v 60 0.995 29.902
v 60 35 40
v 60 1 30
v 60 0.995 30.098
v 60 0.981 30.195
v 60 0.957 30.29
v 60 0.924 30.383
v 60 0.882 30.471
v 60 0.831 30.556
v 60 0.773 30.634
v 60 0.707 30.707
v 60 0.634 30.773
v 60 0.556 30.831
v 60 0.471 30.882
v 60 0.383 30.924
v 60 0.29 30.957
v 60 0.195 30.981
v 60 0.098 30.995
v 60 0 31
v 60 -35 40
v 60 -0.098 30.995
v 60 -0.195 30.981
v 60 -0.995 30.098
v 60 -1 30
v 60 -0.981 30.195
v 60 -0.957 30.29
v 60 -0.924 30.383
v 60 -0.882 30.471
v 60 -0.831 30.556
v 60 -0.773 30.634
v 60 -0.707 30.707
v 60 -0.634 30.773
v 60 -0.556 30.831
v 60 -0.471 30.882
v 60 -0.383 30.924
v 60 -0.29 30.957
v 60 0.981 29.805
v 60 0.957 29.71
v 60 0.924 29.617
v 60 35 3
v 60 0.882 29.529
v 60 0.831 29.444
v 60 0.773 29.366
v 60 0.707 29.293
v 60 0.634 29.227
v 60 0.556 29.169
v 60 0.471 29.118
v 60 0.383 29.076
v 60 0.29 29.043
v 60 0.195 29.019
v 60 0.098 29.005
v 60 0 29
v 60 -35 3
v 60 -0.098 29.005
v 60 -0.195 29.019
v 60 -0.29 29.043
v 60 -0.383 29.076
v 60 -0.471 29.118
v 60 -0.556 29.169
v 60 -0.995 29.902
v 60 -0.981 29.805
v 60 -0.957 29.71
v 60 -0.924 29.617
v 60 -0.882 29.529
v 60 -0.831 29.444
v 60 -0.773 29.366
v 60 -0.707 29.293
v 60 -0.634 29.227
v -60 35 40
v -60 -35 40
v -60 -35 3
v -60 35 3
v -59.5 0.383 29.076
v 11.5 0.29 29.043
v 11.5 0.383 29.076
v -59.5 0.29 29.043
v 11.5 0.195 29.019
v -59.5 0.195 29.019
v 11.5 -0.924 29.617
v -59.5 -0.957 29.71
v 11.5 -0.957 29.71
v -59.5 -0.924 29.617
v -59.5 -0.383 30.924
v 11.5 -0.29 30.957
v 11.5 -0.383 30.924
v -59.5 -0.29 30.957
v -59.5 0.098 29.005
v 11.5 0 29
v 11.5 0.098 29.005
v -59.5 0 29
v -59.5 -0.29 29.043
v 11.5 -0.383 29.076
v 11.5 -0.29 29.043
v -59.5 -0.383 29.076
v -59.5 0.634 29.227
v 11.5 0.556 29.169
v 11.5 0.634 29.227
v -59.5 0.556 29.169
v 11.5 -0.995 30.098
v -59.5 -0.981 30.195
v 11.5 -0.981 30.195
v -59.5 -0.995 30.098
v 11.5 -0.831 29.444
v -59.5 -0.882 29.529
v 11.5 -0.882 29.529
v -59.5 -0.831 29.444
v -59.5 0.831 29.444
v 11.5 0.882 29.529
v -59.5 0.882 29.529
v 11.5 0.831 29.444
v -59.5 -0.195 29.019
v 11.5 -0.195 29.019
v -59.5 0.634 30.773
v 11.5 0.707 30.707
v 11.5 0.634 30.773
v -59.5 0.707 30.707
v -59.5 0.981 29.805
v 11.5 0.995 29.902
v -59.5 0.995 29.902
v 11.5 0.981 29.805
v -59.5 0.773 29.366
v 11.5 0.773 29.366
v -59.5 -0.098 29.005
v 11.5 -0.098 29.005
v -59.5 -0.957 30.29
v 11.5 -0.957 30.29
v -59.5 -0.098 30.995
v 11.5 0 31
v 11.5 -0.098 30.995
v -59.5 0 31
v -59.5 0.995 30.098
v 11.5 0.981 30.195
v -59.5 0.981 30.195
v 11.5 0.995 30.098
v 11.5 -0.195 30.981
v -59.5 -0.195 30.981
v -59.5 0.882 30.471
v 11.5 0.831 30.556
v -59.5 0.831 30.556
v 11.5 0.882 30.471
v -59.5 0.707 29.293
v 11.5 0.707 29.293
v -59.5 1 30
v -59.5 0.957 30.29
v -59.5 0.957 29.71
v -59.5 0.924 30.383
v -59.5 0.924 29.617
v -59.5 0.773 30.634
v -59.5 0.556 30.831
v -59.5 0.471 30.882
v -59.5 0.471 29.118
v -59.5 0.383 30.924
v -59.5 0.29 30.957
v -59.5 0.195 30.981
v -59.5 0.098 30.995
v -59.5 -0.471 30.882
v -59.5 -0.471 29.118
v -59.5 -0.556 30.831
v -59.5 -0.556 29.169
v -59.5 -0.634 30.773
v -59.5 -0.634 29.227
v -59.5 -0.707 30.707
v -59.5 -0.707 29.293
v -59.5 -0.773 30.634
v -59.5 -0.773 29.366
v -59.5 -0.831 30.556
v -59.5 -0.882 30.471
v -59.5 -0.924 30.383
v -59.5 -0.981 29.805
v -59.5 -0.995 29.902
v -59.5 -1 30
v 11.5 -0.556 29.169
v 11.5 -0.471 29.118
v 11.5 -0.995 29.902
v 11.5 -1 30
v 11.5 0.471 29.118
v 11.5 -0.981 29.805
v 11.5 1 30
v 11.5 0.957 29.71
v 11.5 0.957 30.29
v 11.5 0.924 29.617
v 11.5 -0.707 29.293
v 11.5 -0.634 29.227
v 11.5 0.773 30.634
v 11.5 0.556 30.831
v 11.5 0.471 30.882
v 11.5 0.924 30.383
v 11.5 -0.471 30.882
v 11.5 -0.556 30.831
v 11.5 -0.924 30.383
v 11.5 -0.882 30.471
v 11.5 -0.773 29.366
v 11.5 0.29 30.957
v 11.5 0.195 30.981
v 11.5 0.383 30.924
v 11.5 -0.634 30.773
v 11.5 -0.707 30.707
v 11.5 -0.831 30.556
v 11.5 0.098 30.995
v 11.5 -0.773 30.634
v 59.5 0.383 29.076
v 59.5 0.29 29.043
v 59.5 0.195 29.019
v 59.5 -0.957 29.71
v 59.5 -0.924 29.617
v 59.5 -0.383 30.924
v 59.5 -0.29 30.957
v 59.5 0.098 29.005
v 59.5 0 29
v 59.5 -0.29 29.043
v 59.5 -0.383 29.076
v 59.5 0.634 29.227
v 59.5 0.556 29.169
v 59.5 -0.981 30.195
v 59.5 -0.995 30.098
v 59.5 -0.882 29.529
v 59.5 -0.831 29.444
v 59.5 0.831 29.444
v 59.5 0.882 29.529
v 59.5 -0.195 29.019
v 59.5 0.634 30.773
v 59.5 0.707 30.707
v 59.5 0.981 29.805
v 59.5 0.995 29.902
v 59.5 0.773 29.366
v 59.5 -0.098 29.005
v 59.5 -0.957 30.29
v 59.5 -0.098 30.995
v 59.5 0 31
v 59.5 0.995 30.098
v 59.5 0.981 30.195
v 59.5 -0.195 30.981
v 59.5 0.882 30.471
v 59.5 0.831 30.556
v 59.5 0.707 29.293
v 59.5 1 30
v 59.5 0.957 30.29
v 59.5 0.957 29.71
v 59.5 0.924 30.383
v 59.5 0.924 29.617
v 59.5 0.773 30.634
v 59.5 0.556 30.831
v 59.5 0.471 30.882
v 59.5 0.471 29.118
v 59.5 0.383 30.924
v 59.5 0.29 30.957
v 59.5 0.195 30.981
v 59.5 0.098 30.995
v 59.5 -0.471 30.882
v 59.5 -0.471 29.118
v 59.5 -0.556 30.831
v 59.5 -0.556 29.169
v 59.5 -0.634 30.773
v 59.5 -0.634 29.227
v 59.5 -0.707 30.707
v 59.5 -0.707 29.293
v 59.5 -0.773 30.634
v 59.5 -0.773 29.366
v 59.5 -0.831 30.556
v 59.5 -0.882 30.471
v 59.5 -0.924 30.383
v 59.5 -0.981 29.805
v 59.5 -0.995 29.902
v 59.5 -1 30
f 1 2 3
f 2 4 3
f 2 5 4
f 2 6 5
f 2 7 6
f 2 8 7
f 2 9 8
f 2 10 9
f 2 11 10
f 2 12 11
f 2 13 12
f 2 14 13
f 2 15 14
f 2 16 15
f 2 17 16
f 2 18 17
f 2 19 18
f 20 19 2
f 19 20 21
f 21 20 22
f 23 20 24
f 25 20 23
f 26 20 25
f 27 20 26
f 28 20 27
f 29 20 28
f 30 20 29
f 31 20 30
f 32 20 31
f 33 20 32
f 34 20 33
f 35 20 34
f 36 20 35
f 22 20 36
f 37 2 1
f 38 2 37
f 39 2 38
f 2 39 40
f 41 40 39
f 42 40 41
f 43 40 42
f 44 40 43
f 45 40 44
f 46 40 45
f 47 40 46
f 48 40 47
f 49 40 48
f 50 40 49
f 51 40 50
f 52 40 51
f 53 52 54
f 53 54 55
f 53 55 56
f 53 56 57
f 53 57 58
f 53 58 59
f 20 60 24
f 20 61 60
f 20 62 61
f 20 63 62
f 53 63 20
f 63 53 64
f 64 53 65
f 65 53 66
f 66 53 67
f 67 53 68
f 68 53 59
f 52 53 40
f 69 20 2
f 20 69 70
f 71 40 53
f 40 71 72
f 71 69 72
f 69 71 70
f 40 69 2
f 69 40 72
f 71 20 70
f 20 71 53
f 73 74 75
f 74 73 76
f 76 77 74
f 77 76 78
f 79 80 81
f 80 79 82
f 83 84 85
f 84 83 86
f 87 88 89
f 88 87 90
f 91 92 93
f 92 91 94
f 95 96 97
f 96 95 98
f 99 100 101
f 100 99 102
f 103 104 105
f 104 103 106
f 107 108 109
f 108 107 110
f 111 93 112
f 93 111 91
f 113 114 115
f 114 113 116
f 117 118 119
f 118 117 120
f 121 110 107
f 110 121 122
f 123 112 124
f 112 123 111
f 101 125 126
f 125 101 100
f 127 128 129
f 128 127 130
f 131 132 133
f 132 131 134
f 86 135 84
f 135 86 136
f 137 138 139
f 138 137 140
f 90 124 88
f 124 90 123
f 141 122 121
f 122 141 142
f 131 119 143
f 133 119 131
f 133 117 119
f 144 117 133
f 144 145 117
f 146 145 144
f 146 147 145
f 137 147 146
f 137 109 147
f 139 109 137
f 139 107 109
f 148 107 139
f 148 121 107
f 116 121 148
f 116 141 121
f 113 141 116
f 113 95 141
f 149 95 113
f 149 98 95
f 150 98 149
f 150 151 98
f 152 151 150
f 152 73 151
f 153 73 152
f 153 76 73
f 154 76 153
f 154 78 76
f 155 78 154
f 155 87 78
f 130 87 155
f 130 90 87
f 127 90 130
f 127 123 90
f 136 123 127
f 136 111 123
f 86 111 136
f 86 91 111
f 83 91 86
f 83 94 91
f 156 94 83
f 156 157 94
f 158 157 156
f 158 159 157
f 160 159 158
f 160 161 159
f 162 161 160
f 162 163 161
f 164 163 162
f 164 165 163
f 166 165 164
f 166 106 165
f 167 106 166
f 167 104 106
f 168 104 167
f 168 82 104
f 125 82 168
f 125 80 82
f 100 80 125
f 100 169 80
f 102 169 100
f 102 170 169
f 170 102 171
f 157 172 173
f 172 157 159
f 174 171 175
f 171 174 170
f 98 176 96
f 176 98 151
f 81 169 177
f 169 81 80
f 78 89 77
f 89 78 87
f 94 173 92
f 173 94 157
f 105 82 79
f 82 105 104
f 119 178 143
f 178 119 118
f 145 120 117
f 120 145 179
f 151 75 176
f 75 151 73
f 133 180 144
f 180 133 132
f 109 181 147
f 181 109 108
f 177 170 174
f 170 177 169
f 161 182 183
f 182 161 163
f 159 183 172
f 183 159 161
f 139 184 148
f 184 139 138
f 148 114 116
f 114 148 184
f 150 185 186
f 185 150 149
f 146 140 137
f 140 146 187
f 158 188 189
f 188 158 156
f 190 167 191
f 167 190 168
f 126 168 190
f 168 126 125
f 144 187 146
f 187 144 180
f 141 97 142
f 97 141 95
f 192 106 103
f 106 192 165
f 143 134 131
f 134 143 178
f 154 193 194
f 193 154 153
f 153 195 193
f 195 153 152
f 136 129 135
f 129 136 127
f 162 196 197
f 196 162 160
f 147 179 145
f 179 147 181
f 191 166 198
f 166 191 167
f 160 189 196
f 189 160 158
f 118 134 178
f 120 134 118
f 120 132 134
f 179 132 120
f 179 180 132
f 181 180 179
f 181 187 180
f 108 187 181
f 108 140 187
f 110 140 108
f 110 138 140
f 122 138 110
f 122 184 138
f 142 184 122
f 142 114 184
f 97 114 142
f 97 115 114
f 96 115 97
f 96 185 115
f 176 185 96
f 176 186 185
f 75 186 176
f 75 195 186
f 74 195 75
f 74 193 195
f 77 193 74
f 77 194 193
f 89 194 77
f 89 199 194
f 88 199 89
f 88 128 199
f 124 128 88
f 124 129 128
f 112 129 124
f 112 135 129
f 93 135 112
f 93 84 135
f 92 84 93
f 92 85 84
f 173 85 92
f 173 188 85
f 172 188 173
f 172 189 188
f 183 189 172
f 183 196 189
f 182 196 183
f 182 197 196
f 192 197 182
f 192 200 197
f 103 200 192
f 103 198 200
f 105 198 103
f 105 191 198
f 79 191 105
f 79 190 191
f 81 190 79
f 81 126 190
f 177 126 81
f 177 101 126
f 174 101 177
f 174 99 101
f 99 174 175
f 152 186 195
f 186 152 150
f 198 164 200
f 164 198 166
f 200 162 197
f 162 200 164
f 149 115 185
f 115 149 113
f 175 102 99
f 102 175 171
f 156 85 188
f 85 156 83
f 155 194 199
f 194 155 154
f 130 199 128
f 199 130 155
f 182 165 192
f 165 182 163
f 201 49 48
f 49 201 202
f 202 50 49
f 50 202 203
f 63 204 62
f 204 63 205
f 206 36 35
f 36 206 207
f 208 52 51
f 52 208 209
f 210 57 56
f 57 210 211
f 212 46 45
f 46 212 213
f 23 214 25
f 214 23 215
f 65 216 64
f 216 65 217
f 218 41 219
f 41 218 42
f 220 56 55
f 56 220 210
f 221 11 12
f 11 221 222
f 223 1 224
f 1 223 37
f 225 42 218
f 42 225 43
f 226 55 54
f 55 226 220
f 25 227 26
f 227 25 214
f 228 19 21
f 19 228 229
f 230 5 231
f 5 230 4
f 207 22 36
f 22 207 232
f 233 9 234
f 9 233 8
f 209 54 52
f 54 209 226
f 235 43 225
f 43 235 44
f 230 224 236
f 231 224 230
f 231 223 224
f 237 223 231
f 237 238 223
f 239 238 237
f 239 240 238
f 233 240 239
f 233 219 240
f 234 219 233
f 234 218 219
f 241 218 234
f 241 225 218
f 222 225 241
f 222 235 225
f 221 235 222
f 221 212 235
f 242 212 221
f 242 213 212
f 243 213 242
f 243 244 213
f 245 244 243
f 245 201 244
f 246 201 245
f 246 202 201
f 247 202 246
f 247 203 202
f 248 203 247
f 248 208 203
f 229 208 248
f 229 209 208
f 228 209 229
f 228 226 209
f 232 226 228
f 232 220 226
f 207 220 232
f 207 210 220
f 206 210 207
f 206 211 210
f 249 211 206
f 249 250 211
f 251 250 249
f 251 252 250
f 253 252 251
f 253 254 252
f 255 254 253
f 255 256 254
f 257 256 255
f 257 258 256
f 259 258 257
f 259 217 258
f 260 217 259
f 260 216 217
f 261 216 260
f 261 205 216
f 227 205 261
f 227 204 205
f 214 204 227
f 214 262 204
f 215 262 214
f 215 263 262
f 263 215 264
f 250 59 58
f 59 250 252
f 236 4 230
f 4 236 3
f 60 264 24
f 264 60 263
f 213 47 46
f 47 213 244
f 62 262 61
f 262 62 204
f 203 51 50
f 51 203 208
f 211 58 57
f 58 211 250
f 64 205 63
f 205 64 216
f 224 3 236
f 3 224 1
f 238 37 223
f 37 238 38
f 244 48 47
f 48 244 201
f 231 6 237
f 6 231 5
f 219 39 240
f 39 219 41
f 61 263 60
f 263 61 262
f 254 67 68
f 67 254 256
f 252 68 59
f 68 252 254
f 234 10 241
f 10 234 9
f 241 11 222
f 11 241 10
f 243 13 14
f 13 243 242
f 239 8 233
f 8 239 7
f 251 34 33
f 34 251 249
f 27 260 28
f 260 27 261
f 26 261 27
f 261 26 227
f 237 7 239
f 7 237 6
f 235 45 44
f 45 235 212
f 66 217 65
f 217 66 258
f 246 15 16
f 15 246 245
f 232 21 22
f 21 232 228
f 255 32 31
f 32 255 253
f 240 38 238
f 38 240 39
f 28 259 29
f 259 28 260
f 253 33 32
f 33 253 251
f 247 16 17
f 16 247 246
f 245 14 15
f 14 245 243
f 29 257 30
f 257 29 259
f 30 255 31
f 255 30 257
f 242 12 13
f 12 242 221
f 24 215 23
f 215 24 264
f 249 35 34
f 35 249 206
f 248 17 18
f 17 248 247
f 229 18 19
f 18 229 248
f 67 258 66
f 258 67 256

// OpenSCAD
// Mini horizontal gel-electrophoresis box: open-top rectangular tank with a central
// raised gel-tray platform that divides the bottom into two buffer chambers.
// Print orientation: tank standing on its base, z = 0 at the bottom.

$fn = 64;

// ---- Tank dimensions ----
outer_x   = 120;   // outer length along X
outer_y   = 70;    // outer width along Y (full width, used for chamber spacing)
outer_z   = 40;    // outer height along Z
wall      = 3;     // wall thickness (sides and floor)

// ---- Derived inner dimensions ----
inner_x   = outer_x - 2 * wall;   // 114 mm inner length
inner_z   = outer_z - wall;       // 37 mm inner floor height

// ---- Platform (gel tray support) ----
plat_x    = 60;    // platform length along X, centred
plat_top  = 10;    // platform top height above inner floor (z = 13)
plat_y    = outer_y; // platform spans the full inner width

// ---- Electrode holes ----
hole_d    = 2;     // hole diameter
hole_y    = 0;     // hole Y position
hole_z    = 30;    // hole Z position

// ---- Modelling helpers ----
eps       = 0.5;   // overshoot for clean boolean cuts

difference() {
    union() {
        // Tank body: outer block minus the floor thickness (floor sits at z = 0)
        translate([-outer_x / 2, -outer_y / 2, wall])
            cube([outer_x, outer_y, outer_z - wall]);

        // Raised platform in the middle of the tank
        translate([-plat_x / 2, -plat_y / 2, inner_z - plat_top])
            cube([plat_x, plat_y, plat_top]);
    }

    // Horizontal electrode holes through each end wall, along X
    for (sx = [-1, 1])
        translate([sx * (outer_x / 2 - eps), hole_y, hole_z])
            rotate([0, 90, 0])
                cylinder(d = hole_d, h = outer_y + 2 * eps);
}
